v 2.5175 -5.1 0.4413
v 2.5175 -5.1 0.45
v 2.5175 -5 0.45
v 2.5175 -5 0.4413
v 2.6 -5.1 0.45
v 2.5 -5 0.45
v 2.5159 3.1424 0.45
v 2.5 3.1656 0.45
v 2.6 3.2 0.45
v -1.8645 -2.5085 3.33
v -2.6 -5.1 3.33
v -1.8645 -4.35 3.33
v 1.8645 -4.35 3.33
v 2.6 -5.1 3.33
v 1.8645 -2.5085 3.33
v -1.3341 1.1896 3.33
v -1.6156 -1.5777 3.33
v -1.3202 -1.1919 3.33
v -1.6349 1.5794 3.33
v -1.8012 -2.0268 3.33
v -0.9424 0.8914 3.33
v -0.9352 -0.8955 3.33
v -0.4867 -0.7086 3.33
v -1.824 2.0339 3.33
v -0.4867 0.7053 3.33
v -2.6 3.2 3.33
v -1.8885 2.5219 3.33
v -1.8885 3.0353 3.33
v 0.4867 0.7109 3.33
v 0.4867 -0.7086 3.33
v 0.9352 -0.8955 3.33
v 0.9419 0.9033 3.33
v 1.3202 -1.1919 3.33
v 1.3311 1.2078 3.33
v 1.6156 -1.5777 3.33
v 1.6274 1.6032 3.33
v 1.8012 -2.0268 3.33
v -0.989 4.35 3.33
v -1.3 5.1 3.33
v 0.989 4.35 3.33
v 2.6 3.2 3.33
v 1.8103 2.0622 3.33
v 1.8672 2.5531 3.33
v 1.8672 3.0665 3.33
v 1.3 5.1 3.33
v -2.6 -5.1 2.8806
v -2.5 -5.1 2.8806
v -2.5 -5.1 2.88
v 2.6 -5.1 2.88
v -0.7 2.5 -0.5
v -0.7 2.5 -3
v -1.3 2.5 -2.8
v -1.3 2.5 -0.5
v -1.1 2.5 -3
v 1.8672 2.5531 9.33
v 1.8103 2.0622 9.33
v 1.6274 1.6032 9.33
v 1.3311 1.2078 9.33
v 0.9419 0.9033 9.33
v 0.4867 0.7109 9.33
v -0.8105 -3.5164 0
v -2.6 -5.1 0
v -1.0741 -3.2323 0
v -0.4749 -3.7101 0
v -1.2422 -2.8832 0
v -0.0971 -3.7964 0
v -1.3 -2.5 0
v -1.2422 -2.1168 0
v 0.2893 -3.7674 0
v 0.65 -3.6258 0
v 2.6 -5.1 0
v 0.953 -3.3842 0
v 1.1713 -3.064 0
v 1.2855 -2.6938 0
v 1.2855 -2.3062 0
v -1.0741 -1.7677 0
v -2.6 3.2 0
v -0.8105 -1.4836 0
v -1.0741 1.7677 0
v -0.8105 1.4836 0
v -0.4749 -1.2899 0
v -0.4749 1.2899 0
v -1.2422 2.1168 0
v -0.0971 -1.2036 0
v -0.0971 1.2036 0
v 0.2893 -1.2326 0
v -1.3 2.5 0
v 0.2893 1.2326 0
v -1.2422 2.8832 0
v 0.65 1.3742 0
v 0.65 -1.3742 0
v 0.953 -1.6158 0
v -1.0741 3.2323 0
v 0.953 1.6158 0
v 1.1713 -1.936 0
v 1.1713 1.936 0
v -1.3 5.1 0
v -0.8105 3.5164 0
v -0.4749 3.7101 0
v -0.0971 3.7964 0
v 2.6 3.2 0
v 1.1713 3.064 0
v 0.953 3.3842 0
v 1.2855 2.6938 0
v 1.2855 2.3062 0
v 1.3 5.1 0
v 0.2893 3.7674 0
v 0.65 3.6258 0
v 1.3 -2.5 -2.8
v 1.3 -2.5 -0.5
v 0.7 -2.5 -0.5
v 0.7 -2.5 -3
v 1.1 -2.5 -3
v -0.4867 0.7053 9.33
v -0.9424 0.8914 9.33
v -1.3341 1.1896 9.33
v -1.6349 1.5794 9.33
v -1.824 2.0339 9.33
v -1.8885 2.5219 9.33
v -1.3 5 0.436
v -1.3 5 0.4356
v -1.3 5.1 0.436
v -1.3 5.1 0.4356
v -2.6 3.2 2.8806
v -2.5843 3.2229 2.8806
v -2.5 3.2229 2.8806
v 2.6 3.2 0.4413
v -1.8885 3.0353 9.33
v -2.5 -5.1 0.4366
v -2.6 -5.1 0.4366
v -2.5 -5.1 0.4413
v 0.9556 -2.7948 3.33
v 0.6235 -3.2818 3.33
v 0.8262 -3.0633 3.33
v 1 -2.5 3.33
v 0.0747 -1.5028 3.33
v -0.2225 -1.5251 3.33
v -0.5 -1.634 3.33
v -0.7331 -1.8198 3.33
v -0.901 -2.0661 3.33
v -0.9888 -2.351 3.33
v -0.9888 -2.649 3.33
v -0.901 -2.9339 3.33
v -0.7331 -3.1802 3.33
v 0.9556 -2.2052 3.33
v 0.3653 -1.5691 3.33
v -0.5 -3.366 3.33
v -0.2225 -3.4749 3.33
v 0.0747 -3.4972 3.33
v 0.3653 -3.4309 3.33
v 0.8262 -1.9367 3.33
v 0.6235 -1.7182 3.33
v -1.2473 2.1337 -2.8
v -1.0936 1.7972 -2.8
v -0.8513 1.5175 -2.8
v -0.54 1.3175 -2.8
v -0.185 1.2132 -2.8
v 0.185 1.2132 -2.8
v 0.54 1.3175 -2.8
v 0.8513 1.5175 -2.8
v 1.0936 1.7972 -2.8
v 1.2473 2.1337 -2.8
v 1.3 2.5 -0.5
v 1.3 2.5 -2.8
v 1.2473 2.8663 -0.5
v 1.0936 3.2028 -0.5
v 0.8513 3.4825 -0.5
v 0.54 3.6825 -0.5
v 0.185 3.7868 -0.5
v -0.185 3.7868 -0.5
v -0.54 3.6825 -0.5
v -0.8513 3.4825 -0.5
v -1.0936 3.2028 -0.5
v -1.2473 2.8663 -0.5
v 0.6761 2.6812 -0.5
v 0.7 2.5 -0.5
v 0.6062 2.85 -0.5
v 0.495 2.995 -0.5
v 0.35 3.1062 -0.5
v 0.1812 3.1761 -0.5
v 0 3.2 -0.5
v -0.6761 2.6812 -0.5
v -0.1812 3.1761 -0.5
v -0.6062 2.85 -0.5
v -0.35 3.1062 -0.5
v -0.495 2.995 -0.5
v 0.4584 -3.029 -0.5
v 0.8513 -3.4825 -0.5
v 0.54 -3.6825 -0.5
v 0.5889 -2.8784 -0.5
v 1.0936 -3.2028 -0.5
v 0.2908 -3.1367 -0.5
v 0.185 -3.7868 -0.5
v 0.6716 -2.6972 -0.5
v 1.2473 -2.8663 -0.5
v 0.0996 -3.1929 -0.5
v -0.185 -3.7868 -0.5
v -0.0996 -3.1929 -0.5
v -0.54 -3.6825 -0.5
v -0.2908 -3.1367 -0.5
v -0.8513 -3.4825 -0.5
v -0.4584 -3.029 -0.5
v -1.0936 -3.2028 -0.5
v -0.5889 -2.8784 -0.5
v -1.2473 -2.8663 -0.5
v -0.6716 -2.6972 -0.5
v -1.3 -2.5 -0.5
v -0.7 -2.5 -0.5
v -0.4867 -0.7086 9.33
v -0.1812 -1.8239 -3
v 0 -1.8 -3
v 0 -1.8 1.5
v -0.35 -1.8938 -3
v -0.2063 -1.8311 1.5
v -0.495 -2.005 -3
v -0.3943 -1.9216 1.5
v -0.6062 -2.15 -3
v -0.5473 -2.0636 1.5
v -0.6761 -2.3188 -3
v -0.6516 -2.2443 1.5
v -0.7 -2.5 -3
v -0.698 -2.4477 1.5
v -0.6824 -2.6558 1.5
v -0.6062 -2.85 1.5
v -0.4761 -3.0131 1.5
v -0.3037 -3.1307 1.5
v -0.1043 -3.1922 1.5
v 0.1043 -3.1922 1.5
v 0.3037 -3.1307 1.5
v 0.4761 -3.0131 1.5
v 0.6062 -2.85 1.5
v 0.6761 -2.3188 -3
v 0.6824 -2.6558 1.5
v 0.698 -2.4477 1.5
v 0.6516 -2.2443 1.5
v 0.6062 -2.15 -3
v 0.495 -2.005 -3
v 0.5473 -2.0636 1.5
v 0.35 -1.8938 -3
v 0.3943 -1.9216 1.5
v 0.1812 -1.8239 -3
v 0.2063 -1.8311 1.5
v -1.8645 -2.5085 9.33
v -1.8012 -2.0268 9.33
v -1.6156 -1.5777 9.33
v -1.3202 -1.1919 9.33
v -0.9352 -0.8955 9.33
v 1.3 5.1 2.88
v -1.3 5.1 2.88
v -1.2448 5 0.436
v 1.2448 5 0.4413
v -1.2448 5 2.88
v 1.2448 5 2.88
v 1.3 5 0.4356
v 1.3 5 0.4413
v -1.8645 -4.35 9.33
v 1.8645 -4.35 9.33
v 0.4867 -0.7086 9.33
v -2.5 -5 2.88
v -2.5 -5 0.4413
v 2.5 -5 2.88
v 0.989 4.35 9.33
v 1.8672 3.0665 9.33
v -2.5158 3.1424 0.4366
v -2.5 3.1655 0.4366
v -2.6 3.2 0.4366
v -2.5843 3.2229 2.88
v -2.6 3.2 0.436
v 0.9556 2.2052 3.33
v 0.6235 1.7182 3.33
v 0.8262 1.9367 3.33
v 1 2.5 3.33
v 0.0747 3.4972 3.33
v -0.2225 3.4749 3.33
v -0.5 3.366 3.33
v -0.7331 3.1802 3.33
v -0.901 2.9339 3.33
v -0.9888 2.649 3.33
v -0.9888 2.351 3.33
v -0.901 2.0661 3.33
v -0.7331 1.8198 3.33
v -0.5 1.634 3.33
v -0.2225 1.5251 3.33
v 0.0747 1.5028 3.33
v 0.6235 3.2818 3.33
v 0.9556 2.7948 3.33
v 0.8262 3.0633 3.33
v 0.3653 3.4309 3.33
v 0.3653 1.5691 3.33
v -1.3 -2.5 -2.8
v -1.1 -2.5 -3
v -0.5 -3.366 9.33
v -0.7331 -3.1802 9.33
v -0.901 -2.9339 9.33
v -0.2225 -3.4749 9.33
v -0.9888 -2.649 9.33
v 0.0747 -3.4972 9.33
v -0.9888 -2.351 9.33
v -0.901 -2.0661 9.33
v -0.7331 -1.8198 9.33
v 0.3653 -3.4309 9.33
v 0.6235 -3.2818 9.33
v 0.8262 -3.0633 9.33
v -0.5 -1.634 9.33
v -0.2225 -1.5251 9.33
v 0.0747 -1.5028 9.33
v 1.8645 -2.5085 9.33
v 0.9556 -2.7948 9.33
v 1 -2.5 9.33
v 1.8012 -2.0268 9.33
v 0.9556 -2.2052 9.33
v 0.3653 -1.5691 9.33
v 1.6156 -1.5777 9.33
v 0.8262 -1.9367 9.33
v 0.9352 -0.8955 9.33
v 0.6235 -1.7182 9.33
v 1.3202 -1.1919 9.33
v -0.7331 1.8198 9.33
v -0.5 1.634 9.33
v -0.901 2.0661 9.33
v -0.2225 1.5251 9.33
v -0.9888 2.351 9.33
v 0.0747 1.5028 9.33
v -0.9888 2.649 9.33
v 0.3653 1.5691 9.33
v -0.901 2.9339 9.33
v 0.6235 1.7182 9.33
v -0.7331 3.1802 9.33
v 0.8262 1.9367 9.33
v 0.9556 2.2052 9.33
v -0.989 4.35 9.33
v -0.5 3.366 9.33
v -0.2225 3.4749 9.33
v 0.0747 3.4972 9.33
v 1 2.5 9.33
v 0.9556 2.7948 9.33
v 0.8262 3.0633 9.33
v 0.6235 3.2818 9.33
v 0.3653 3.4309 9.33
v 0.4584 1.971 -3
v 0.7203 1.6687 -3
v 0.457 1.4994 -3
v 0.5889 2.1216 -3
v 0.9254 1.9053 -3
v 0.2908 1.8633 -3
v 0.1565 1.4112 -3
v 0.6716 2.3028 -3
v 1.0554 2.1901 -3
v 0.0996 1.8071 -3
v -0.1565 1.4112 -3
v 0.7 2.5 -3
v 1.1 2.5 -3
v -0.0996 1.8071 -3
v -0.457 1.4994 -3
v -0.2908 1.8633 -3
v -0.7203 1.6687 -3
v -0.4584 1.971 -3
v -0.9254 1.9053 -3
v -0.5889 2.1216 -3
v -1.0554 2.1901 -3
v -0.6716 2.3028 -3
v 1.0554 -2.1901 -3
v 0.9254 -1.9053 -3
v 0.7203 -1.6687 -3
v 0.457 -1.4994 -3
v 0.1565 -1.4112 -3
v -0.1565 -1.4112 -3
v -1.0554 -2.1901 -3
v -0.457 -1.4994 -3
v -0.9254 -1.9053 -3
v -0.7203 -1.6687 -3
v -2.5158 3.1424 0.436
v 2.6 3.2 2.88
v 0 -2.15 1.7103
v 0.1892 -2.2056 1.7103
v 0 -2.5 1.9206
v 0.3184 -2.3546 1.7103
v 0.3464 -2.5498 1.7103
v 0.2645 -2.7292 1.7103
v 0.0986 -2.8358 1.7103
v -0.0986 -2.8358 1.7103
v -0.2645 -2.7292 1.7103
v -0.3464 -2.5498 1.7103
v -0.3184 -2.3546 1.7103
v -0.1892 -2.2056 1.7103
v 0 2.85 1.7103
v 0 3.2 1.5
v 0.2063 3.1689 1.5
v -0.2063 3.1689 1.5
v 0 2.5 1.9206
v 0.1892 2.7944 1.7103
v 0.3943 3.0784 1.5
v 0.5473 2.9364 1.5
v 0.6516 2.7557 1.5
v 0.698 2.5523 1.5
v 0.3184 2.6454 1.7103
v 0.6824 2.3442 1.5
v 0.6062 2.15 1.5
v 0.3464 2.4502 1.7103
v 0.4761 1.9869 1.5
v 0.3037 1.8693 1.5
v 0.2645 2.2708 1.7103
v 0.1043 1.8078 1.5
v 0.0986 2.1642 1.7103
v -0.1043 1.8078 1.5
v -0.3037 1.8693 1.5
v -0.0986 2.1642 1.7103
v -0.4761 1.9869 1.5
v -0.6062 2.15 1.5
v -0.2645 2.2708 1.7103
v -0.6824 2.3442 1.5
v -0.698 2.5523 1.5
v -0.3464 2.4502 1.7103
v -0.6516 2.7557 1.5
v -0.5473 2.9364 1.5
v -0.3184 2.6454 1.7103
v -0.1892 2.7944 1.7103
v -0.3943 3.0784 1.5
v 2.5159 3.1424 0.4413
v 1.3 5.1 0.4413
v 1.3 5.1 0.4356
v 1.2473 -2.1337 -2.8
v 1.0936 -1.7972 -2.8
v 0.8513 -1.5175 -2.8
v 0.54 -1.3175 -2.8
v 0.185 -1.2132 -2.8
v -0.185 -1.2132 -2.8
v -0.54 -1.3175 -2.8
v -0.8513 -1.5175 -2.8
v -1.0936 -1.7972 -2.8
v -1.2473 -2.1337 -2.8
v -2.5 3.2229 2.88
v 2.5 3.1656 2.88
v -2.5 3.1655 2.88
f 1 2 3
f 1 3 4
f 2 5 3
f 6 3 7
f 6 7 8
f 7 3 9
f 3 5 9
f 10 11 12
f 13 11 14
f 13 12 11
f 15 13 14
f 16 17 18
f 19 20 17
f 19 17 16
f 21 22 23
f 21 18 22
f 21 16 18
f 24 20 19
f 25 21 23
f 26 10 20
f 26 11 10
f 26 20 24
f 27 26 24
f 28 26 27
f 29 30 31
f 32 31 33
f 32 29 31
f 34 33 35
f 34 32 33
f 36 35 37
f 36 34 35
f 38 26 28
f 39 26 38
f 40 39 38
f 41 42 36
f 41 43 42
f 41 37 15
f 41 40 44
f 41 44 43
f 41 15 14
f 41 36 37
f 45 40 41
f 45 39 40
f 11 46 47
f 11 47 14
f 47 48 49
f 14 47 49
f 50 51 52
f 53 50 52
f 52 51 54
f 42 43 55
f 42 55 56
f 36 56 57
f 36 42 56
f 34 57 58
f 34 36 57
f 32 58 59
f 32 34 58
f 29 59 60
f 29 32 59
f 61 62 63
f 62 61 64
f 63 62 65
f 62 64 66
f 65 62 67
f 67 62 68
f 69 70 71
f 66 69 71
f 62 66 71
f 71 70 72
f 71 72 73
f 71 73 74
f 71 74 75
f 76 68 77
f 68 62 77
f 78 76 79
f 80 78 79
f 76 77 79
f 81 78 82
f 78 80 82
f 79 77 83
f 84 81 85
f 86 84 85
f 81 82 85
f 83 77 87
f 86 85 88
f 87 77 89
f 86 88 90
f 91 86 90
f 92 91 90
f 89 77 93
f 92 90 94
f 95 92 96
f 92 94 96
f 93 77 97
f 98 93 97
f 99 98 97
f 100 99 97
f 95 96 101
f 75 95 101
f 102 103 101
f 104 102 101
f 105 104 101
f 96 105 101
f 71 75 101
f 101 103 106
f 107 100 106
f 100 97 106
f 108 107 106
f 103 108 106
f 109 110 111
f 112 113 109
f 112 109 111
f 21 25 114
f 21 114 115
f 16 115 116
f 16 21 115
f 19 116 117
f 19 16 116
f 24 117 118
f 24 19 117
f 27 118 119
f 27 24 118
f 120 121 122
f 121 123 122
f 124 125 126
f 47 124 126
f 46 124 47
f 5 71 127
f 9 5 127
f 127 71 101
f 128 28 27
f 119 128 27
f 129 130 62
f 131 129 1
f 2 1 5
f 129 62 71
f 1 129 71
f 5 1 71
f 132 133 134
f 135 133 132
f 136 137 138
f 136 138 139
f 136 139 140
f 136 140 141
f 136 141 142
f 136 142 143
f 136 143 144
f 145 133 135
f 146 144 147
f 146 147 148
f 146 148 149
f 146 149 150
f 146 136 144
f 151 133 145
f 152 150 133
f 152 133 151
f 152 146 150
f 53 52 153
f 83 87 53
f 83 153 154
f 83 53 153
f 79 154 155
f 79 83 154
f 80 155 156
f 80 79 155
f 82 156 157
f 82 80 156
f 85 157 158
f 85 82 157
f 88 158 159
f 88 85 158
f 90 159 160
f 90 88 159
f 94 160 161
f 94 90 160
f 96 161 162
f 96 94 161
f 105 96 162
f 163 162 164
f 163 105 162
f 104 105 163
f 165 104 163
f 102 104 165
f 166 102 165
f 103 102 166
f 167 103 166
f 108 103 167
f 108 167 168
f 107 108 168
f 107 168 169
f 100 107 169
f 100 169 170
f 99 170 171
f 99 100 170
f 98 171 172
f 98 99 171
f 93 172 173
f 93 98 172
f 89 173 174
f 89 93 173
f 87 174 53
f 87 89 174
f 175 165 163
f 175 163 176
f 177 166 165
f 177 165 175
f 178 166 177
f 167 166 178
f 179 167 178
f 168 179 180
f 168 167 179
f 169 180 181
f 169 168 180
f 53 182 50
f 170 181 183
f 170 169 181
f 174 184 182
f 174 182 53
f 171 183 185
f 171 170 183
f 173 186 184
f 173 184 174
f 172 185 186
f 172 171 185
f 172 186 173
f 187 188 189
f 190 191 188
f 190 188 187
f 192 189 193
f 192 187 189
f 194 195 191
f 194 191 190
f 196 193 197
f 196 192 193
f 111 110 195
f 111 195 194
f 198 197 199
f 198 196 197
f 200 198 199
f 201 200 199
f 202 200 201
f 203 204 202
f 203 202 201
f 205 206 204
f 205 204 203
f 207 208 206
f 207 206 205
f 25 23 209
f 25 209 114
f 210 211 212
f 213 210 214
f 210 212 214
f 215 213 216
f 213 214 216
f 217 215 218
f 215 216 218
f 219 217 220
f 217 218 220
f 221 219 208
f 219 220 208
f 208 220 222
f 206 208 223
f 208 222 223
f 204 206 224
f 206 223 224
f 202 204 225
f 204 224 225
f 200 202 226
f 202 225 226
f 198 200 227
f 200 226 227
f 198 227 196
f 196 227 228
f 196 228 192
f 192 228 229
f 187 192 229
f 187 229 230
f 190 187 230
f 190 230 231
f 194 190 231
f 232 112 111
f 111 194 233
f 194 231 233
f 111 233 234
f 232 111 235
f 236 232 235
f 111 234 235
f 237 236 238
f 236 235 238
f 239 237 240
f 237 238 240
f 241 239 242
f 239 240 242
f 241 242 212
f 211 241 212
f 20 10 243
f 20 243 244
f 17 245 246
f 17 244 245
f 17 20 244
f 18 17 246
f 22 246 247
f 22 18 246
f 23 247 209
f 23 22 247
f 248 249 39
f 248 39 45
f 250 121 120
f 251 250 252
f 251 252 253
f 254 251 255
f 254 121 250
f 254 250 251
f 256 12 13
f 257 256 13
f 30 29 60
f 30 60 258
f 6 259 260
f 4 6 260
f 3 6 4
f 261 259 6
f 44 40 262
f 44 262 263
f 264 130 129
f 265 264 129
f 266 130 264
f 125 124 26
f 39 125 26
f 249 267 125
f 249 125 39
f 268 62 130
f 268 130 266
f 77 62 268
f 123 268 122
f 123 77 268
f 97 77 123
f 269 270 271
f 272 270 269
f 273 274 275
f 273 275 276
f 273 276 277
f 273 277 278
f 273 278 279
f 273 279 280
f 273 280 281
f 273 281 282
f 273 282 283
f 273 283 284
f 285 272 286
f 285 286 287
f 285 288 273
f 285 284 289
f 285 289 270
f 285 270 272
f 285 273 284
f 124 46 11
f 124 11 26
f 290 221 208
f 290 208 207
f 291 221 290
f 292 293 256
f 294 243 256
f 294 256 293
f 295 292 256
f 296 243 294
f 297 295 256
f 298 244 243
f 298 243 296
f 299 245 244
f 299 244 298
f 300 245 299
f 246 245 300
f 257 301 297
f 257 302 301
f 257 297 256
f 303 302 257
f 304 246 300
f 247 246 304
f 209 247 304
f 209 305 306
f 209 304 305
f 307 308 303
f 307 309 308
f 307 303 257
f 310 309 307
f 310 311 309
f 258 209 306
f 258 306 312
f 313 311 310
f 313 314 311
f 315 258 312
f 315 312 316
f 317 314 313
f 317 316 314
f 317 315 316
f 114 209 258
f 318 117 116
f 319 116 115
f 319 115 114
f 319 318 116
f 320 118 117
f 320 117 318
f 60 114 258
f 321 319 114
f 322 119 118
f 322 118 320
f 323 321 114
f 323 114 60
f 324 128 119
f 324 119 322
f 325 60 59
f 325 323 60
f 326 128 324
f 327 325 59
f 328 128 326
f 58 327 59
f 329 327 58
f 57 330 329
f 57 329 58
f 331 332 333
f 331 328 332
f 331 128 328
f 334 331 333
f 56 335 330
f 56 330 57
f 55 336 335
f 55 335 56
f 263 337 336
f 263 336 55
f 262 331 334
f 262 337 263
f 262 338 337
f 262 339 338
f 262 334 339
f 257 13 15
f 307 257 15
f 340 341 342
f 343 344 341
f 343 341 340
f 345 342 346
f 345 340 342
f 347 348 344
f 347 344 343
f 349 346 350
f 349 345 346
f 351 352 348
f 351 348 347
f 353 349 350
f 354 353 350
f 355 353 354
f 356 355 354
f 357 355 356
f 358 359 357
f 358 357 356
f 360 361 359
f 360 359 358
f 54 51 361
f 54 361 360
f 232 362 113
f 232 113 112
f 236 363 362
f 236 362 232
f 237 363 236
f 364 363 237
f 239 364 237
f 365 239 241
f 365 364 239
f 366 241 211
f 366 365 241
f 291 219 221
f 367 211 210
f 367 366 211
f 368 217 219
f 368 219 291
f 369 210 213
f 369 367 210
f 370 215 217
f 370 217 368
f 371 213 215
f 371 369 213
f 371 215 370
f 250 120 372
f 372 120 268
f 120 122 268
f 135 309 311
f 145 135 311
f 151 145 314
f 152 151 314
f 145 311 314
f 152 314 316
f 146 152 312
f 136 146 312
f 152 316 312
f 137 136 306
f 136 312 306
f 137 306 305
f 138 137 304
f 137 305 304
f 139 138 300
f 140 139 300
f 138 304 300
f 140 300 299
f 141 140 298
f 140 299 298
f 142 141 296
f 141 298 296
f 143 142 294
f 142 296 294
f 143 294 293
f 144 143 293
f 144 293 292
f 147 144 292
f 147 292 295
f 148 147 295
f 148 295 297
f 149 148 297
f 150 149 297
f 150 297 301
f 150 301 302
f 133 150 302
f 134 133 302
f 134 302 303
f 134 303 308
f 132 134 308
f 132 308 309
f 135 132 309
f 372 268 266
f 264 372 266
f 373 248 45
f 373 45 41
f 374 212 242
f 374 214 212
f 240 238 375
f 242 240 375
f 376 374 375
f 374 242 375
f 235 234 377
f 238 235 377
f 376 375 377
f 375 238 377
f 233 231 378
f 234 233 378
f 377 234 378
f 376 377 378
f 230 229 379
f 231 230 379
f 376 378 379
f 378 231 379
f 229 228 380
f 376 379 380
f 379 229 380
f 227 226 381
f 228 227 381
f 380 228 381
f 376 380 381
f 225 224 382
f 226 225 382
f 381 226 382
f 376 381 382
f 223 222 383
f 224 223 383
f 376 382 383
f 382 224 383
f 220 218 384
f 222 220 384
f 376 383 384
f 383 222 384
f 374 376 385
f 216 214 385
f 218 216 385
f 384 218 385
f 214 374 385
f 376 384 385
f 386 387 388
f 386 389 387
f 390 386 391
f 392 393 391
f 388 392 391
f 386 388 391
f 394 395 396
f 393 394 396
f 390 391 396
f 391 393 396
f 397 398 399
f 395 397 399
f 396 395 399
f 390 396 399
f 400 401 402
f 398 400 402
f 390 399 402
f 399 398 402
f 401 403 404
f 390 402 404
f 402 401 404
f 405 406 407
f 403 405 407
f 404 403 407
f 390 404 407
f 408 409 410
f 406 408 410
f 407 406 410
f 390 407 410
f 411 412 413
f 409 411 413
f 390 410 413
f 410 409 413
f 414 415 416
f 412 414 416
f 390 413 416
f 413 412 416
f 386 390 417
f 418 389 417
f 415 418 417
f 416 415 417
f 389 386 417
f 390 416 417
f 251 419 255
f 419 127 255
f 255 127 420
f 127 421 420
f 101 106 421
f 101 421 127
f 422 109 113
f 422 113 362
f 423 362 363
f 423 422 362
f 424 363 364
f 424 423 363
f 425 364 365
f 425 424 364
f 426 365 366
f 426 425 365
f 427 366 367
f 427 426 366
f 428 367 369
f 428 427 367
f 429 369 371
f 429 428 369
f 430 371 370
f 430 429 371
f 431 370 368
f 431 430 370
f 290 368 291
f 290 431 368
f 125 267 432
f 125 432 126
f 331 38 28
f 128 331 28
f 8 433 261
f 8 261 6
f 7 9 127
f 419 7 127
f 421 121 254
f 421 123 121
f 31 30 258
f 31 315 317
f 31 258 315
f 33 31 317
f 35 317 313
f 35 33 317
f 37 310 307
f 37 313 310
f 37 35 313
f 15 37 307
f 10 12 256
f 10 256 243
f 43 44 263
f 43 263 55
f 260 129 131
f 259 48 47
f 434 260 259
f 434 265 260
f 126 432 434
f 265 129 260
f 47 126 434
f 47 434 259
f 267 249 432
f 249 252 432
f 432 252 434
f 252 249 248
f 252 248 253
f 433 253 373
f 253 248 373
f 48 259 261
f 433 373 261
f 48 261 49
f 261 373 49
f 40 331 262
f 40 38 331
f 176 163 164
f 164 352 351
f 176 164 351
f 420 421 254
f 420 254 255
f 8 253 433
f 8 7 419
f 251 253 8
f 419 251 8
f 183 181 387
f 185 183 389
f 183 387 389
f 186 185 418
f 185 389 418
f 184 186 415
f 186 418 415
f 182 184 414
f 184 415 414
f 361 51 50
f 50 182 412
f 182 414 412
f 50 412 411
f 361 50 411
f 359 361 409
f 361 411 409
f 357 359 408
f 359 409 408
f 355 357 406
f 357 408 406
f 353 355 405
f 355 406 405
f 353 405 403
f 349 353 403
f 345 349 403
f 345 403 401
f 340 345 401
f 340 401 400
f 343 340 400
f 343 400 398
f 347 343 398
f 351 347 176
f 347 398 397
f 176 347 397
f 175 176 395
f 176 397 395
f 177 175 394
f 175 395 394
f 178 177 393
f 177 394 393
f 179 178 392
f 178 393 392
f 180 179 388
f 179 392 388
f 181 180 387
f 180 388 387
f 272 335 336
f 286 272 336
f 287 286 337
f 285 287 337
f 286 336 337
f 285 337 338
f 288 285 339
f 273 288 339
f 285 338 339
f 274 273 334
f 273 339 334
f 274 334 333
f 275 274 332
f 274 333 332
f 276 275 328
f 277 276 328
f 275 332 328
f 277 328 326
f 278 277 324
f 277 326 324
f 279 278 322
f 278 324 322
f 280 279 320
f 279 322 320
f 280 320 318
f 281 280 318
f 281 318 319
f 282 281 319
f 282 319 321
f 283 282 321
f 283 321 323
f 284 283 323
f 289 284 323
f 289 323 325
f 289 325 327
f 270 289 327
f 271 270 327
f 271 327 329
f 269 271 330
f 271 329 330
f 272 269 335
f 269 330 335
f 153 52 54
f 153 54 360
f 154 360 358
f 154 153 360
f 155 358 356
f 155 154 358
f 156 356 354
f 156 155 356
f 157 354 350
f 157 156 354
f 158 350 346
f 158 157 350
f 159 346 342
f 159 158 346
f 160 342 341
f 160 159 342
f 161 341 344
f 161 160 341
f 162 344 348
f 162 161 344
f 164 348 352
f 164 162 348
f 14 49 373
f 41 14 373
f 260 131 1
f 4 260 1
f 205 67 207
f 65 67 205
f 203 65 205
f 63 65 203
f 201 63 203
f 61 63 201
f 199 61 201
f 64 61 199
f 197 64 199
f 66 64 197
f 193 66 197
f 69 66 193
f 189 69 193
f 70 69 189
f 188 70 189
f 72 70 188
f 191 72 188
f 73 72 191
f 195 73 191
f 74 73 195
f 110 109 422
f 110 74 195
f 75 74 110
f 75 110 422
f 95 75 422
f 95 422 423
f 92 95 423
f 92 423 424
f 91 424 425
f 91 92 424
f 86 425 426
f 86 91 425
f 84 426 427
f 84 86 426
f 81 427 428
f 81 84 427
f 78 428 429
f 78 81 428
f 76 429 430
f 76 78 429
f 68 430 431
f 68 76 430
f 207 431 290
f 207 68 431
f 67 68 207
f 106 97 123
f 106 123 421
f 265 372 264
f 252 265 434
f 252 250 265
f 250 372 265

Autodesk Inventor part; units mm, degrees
ref_plane "YZ Plane" through (0, 0, 0) normal (1, 0, 0) x (0, 1, 0)
ref_plane "XZ Plane" through (0, 0, 0) normal (0, 1, 0) x (-1, 0, 0)
ref_plane "XY Plane" through (0, 0, 0) normal (0, 0, 1) x (1, 0, 0)
sketch "Skizze1" plane through (0, 0, 0) normal (0, 0, 1) x (1, 0, 0)
  line L0 (-2.6, -5.1) -> (2.6, -5.1)
  line L1 (2.6, -5.1) -> (2.6, 3.2)
  line L2 (-2.6, -5.1) -> (-2.6, 3.2)
  line L3 (-1.3, 5.1) -> (1.3, 5.1)
  line L4 (0, -5.1) -> (0, 5.1) construction
  line L5 (-2.6, 3.2) -> (-1.3, 5.1)
  line L6 (1.3, 5.1) -> (2.6, 3.2)
  point P0 (0, 0)
  point P1 (0, 0)
  dimension "d0" = 5.2
  dimension "d1" = 8.3
  dimension "d2" = 2.6
  dimension "d3" = 10.2
extrude "Extrusion1" add sketch "Skizze1" along normal blind 3.33
sketch "Skizze3" plane through (0, 0, 3.33) normal (0, 0, 1) x (1, 0, 0)
  line L0 (0, -0.674) -> (0, 0.674) construction
  line L1 (0, 0) -> (0, 4.35) construction
  line L2 (-0.989, 4.35) -> (0.989, 4.35)
  line L3 (0.989, 4.35) -> (1.8672, 3.0665)
  line L4 (-0.989, 4.35) -> (-1.8885, 3.0353)
  line L5 (-1.3, 5.1) -> (-2.6, 3.2) projected
  line L6 (2.6, 3.2) -> (1.3, 5.1) projected
  circle A0 centre (0, 2.5) radius 0.5 construction
  circle A1 centre (0, 2.5) radius 0.5 construction
  line L7 (-1.8885, 3.0353) -> (-1.8885, 2.5219)
  line L8 (1.8672, 3.0665) -> (1.8672, 2.5531)
  arc A2 (-1.8885, 2.5219) -> (1.8672, 2.5531) centre (-0.0105, 2.5219) ccw
  dimension "d11" = 1.348
  dimension "d12" = 4.35
  dimension "d13" = 1.978
extrude "Extrusion3" add sketch "Skizze3" along normal blind 6
sketch "Skizze4" plane through (0, 0, 3.33) normal (0, 0, 1) x (1, 0, 0)
  line L0 (-2.6, 3.2) -> (-2.6, -5.1) construction
  line L1 (-2.6, -4.6629) -> (-2.6, -0.9339) construction
  line L2 (-1.8645, -4.35) -> (1.8645, -4.35)
  arc A0 (-1.8885, 2.5219) -> (1.8672, 2.5531) centre (-0.0105, 2.5219) ccw projected
  line L3 (-1.8645, -4.35) -> (-1.8645, -2.5085)
  line L4 (1.8645, -4.35) -> (1.8645, -2.5085)
  arc A1 (1.8645, -2.5085) -> (-1.8645, -2.5085) centre (0, -2.5085) ccw
  line L5 (-0.4867, 0.8046) -> (0.4867, 0.8046)
  line L6 (0.4867, 0.8046) -> (0.4867, -0.8046)
  line L7 (0.4867, -0.8046) -> (-0.4867, -0.8046)
  line L8 (-0.4867, -0.8046) -> (-0.4867, 0.8046)
  line L9 (-0.4867, 0.8046) -> (0.4867, -0.8046) construction
  point P0 (0, 0)
  point P1 (0, 0)
  dimension "d18" = 3.729
extrude "Extrusion4" add sketch "Skizze4" along normal blind 6
sketch "Skizze5" plane through (0, 0, 9.33) normal (0, 0, 1) x (1, 0, 0)
  line L0 (0, -2.5) -> (0, 2.5) construction
  circle A0 centre (0, 2.5) radius 1
  circle A1 centre (0, -2.5) radius 1
  point P0 (0, 0)
  point P1 (0, 0)
  point P2 (0, 0)
  dimension "d22" = 5
  dimension "d23" = 2
  dimension "d24" = 2
extrude "Extrusion5" cut sketch "Skizze5" against normal blind 6
sketch "Skizze6" plane through (2.6, -5.1, 0) normal (1, 0, 0) x (0, 0, -1)
  line L0 (-3.33, 4.3914) -> (-9.33, 4.3914) construction
  line L1 (-3.33, 4.3914) -> (-2.88, 4.3914) construction
  line L2 (0, 5.1) -> (-0.45, 5.1) construction
  line L3 (0, 0) -> (-3.33, 0) projected
  line L4 (0, 8.3) -> (-3.33, 8.3) projected
  line L5 (-2.88, 0) -> (-0.45, 0)
  line L6 (-0.45, 0) -> (-0.45, 8.3)
  line L7 (-0.45, 8.3) -> (-2.88, 8.3)
  line L8 (-2.88, 8.3) -> (-2.88, 0)
  dimension "d31" = 0.45
  dimension "d32" = 0.45
extrude "Extrusion6" cut sketch "Skizze6" against normal blind 0.1
sketch "Skizze7" plane through (1.3, 5.1, 3.33) normal (0.8253, 0.5647, 0) x (0, 0, -1)
  line L0 (0.45, -2.3022) -> (0, -2.3022) projected
  line L1 (3.33, 0) -> (0, 0) projected
  line L2 (0.45, -2.3022) -> (2.8887, -2.3022)
  line L3 (2.8887, -2.3022) -> (2.8887, 0)
  line L4 (2.8887, 0) -> (0.45, 0)
  line L5 (0.45, 0) -> (0.45, -2.3022)
  point P0 (3.33, -3.475)
extrude "Extrusion7" cut sketch "Skizze7" against normal blind 0.1
sketch "Skizze8" plane through (-1.3, 5.1, 0) normal (0, 1, 0) x (1, 0, 0)
  line L0 (2.6, -2.88) -> (2.6, -3.33) projected
  line L1 (0, 0) -> (0, -3.33) projected
  line L2 (2.6, -2.88) -> (0, -2.88)
  line L3 (0, -2.88) -> (0, -0.4356)
  line L4 (0, -0.4356) -> (2.6, -0.4356)
  line L5 (2.6, -0.4356) -> (2.6, -2.88)
  point P0 (1.3, 0)
extrude "Extrusion8" cut sketch "Skizze8" against normal blind 0.1
sketch "Skizze9" plane through (-2.6, 3.2, 0) normal (-0.8253, 0.5647, 0) x (0, 0, 1)
  line L0 (2.88, 3.7704) -> (2.88, 2.3022) projected
  line L1 (0, 0) -> (3.33, 0) projected
  line L2 (2.88, 2.3022) -> (0.436, 2.3022)
  line L3 (0.436, 2.3022) -> (0.436, 0)
  line L4 (0.436, 0) -> (2.88, 0)
  line L5 (2.88, 0) -> (2.88, 2.3022)
  point P0 (0, -1.1728)
  dimension "d39" = 2.444
extrude "Extrusion9" cut sketch "Skizze9" against normal blind 0.1
sketch "Skizze10" plane through (-2.6, -5.1, 0) normal (-1, 0, 0) x (0, 0, 1)
  line L0 (0.4366, 8.3229) -> (2.8806, 8.3229)
  line L1 (2.8806, 8.3229) -> (2.8806, 0)
  line L2 (2.8806, 0) -> (0.4366, 0)
  line L3 (0.4366, 0) -> (0.4366, 8.3229)
  point P0 (0, 5.1)
  dimension "d42" = 2.444
extrude "Extrusion10" cut sketch "Skizze10" against normal blind 0.1
sketch "Skizze11" plane through (-2.6, -5.1, 0) normal (0, -1, 0) x (1, 0, 0)
  line L0 (1.3, 2.88) -> (0.0157, 2.88) projected
  line L1 (3.8473, 0.4413) -> (5.1175, 0.4413) projected
  line L2 (0.0989, 2.88) -> (5.1175, 2.88)
  line L3 (5.1175, 2.88) -> (5.1175, 0.4413)
  line L4 (5.1175, 0.4413) -> (0.0989, 0.4413)
  line L5 (0.0989, 0.4413) -> (0.0989, 2.88)
  point P0 (2.6, 0)
extrude "Extrusion11" cut sketch "Skizze11" against normal blind 0.1
sketch "Skizze12" plane through (0, 0, 0) normal (0, 0, -1) x (-1, 0, 0)
  circle A0 centre (0, -2.5) radius 1 construction
  circle A1 centre (0, -2.5) radius 1 construction
  circle A2 centre (0, 2.5) radius 1 construction
  circle A3 centre (0, 2.5) radius 1 construction
  circle A4 centre (0, -2.5) radius 1.3
  circle A5 centre (0, 2.5) radius 1.3
  point P0 (0, 0)
  dimension "d47" = 2.6
extrude "Extrusion12" add sketch "Skizze12" along normal blind 3
chamfer "Fase1" distance 0.2 angle 45 2 edges at (1.3, -2.5, -3) (1.3, 2.5, -3)
sketch "Skizze13" plane through (0, -2.5, -3) normal (0, 0, -1) x (-1, 0, 0)
  circle A0 centre (0, 0) radius 1.1 projected
  circle A1 centre (0, 5) radius 1.1 projected
  point P0 (0, 2.5)
hole "Bohrung1" at (0, 2.5, -3) at (0, -2.5, -3) direction (0, 0, 1) diameter 1.4 depth 4.5 tip angle 118
sketch "Skizze14" plane through (0, -2.5, -3) normal (0, 0, -1) x (-1, 0, 0)
  circle A0 centre (0, 0) radius 1.3 construction
  circle A1 centre (0, 5) radius 1.3 construction
  line L0 (2.6, -2.6) -> (-2.6, -2.6) construction
  line L1 (2.6, 5.7) -> (2.6, -2.6) construction
  line L2 (1.3, 7.6) -> (2.6, 5.7) construction
  line L3 (-1.3, 7.6) -> (1.3, 7.6) construction
  line L4 (-2.6, 5.7) -> (-1.3, 7.6) construction
  line L5 (-2.6, -2.6) -> (-2.6, 5.7) construction
  line L6 (-1.3, 0) -> (1.3, 0)
  line L7 (-1.3, 5) -> (1.3, 5)
  circle A2 centre (0, 0) radius 1.3 projected
  arc A3 (-1.3, 0) -> (1.3, 0) centre (0, 0) ccw
  circle A4 centre (0, 5) radius 0.7 projected
  arc A5 (1.3, 5) -> (-1.3, 5) centre (0, 5) ccw
  point P0 (0, 2.5)
extrude "Extrusion13" cut sketch "Skizze14" against normal blind 2.5 contours L6 A2 | A4 L7 A5 | L7 A4 picked at (-0.4207, -0.1037) picked at (0.2266, 5.0558)
properties part number "stecker2"
